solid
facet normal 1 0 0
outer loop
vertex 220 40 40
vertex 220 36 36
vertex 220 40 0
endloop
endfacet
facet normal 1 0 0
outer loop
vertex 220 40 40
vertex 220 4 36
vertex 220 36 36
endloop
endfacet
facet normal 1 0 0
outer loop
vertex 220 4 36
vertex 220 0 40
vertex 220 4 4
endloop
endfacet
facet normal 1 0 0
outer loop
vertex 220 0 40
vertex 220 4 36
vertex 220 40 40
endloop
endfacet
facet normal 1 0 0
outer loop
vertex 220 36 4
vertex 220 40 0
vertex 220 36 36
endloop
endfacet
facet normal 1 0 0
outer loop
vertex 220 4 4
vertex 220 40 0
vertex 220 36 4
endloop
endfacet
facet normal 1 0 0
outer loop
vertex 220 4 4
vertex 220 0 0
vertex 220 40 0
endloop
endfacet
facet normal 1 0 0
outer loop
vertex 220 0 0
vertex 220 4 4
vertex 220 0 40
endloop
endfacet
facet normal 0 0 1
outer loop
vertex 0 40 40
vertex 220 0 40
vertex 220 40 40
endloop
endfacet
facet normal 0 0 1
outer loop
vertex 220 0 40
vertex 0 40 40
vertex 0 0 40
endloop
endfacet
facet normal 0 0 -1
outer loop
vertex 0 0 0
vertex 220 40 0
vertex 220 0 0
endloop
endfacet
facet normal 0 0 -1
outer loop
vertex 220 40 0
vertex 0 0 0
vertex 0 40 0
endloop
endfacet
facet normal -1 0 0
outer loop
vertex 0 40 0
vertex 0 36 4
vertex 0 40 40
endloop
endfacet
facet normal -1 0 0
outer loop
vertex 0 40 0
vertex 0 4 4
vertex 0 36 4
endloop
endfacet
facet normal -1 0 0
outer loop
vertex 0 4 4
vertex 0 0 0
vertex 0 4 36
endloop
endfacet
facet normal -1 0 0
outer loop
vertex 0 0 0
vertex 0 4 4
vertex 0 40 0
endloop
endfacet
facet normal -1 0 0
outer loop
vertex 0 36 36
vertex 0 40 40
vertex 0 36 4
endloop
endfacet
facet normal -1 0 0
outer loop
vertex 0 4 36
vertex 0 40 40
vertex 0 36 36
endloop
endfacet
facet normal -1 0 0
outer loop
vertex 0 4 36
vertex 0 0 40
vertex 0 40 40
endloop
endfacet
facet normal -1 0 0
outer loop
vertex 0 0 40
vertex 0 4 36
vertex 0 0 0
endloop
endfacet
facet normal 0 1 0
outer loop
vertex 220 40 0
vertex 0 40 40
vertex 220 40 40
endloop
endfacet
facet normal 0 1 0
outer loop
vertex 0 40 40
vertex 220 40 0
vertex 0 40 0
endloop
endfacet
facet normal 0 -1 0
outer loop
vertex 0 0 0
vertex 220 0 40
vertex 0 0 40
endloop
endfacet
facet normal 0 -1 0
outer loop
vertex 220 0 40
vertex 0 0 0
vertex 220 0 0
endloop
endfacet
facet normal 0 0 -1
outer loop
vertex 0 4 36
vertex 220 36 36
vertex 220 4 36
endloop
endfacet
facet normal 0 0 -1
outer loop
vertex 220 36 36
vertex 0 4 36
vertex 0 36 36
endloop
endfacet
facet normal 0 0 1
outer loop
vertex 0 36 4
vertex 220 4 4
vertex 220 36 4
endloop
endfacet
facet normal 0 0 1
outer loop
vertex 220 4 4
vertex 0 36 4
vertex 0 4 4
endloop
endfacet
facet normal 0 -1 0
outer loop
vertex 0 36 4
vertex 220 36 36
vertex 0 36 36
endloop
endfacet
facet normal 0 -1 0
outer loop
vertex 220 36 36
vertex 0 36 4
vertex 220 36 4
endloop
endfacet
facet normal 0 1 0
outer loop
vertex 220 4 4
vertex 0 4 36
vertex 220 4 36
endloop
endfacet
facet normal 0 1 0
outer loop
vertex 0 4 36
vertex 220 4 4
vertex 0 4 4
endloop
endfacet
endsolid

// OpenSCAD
$fn = 32;

// ----------------------------------------------------------------------
// Box beam: 200-250 mm hollow beam
// ----------------------------------------------------------------------

// --- parameters (mm) ---
beam_l = 220;             // beam length, X
beam_w = 40;              // beam width, Y
beam_h = 40;              // beam height, Z
wall = 4;                 // wall thickness

difference() {
  cube([beam_l, beam_w, beam_h]);
  translate([-1, wall, wall])
    cube([beam_l + 2, beam_w - 2 * wall, beam_h - 2 * wall]);
}
